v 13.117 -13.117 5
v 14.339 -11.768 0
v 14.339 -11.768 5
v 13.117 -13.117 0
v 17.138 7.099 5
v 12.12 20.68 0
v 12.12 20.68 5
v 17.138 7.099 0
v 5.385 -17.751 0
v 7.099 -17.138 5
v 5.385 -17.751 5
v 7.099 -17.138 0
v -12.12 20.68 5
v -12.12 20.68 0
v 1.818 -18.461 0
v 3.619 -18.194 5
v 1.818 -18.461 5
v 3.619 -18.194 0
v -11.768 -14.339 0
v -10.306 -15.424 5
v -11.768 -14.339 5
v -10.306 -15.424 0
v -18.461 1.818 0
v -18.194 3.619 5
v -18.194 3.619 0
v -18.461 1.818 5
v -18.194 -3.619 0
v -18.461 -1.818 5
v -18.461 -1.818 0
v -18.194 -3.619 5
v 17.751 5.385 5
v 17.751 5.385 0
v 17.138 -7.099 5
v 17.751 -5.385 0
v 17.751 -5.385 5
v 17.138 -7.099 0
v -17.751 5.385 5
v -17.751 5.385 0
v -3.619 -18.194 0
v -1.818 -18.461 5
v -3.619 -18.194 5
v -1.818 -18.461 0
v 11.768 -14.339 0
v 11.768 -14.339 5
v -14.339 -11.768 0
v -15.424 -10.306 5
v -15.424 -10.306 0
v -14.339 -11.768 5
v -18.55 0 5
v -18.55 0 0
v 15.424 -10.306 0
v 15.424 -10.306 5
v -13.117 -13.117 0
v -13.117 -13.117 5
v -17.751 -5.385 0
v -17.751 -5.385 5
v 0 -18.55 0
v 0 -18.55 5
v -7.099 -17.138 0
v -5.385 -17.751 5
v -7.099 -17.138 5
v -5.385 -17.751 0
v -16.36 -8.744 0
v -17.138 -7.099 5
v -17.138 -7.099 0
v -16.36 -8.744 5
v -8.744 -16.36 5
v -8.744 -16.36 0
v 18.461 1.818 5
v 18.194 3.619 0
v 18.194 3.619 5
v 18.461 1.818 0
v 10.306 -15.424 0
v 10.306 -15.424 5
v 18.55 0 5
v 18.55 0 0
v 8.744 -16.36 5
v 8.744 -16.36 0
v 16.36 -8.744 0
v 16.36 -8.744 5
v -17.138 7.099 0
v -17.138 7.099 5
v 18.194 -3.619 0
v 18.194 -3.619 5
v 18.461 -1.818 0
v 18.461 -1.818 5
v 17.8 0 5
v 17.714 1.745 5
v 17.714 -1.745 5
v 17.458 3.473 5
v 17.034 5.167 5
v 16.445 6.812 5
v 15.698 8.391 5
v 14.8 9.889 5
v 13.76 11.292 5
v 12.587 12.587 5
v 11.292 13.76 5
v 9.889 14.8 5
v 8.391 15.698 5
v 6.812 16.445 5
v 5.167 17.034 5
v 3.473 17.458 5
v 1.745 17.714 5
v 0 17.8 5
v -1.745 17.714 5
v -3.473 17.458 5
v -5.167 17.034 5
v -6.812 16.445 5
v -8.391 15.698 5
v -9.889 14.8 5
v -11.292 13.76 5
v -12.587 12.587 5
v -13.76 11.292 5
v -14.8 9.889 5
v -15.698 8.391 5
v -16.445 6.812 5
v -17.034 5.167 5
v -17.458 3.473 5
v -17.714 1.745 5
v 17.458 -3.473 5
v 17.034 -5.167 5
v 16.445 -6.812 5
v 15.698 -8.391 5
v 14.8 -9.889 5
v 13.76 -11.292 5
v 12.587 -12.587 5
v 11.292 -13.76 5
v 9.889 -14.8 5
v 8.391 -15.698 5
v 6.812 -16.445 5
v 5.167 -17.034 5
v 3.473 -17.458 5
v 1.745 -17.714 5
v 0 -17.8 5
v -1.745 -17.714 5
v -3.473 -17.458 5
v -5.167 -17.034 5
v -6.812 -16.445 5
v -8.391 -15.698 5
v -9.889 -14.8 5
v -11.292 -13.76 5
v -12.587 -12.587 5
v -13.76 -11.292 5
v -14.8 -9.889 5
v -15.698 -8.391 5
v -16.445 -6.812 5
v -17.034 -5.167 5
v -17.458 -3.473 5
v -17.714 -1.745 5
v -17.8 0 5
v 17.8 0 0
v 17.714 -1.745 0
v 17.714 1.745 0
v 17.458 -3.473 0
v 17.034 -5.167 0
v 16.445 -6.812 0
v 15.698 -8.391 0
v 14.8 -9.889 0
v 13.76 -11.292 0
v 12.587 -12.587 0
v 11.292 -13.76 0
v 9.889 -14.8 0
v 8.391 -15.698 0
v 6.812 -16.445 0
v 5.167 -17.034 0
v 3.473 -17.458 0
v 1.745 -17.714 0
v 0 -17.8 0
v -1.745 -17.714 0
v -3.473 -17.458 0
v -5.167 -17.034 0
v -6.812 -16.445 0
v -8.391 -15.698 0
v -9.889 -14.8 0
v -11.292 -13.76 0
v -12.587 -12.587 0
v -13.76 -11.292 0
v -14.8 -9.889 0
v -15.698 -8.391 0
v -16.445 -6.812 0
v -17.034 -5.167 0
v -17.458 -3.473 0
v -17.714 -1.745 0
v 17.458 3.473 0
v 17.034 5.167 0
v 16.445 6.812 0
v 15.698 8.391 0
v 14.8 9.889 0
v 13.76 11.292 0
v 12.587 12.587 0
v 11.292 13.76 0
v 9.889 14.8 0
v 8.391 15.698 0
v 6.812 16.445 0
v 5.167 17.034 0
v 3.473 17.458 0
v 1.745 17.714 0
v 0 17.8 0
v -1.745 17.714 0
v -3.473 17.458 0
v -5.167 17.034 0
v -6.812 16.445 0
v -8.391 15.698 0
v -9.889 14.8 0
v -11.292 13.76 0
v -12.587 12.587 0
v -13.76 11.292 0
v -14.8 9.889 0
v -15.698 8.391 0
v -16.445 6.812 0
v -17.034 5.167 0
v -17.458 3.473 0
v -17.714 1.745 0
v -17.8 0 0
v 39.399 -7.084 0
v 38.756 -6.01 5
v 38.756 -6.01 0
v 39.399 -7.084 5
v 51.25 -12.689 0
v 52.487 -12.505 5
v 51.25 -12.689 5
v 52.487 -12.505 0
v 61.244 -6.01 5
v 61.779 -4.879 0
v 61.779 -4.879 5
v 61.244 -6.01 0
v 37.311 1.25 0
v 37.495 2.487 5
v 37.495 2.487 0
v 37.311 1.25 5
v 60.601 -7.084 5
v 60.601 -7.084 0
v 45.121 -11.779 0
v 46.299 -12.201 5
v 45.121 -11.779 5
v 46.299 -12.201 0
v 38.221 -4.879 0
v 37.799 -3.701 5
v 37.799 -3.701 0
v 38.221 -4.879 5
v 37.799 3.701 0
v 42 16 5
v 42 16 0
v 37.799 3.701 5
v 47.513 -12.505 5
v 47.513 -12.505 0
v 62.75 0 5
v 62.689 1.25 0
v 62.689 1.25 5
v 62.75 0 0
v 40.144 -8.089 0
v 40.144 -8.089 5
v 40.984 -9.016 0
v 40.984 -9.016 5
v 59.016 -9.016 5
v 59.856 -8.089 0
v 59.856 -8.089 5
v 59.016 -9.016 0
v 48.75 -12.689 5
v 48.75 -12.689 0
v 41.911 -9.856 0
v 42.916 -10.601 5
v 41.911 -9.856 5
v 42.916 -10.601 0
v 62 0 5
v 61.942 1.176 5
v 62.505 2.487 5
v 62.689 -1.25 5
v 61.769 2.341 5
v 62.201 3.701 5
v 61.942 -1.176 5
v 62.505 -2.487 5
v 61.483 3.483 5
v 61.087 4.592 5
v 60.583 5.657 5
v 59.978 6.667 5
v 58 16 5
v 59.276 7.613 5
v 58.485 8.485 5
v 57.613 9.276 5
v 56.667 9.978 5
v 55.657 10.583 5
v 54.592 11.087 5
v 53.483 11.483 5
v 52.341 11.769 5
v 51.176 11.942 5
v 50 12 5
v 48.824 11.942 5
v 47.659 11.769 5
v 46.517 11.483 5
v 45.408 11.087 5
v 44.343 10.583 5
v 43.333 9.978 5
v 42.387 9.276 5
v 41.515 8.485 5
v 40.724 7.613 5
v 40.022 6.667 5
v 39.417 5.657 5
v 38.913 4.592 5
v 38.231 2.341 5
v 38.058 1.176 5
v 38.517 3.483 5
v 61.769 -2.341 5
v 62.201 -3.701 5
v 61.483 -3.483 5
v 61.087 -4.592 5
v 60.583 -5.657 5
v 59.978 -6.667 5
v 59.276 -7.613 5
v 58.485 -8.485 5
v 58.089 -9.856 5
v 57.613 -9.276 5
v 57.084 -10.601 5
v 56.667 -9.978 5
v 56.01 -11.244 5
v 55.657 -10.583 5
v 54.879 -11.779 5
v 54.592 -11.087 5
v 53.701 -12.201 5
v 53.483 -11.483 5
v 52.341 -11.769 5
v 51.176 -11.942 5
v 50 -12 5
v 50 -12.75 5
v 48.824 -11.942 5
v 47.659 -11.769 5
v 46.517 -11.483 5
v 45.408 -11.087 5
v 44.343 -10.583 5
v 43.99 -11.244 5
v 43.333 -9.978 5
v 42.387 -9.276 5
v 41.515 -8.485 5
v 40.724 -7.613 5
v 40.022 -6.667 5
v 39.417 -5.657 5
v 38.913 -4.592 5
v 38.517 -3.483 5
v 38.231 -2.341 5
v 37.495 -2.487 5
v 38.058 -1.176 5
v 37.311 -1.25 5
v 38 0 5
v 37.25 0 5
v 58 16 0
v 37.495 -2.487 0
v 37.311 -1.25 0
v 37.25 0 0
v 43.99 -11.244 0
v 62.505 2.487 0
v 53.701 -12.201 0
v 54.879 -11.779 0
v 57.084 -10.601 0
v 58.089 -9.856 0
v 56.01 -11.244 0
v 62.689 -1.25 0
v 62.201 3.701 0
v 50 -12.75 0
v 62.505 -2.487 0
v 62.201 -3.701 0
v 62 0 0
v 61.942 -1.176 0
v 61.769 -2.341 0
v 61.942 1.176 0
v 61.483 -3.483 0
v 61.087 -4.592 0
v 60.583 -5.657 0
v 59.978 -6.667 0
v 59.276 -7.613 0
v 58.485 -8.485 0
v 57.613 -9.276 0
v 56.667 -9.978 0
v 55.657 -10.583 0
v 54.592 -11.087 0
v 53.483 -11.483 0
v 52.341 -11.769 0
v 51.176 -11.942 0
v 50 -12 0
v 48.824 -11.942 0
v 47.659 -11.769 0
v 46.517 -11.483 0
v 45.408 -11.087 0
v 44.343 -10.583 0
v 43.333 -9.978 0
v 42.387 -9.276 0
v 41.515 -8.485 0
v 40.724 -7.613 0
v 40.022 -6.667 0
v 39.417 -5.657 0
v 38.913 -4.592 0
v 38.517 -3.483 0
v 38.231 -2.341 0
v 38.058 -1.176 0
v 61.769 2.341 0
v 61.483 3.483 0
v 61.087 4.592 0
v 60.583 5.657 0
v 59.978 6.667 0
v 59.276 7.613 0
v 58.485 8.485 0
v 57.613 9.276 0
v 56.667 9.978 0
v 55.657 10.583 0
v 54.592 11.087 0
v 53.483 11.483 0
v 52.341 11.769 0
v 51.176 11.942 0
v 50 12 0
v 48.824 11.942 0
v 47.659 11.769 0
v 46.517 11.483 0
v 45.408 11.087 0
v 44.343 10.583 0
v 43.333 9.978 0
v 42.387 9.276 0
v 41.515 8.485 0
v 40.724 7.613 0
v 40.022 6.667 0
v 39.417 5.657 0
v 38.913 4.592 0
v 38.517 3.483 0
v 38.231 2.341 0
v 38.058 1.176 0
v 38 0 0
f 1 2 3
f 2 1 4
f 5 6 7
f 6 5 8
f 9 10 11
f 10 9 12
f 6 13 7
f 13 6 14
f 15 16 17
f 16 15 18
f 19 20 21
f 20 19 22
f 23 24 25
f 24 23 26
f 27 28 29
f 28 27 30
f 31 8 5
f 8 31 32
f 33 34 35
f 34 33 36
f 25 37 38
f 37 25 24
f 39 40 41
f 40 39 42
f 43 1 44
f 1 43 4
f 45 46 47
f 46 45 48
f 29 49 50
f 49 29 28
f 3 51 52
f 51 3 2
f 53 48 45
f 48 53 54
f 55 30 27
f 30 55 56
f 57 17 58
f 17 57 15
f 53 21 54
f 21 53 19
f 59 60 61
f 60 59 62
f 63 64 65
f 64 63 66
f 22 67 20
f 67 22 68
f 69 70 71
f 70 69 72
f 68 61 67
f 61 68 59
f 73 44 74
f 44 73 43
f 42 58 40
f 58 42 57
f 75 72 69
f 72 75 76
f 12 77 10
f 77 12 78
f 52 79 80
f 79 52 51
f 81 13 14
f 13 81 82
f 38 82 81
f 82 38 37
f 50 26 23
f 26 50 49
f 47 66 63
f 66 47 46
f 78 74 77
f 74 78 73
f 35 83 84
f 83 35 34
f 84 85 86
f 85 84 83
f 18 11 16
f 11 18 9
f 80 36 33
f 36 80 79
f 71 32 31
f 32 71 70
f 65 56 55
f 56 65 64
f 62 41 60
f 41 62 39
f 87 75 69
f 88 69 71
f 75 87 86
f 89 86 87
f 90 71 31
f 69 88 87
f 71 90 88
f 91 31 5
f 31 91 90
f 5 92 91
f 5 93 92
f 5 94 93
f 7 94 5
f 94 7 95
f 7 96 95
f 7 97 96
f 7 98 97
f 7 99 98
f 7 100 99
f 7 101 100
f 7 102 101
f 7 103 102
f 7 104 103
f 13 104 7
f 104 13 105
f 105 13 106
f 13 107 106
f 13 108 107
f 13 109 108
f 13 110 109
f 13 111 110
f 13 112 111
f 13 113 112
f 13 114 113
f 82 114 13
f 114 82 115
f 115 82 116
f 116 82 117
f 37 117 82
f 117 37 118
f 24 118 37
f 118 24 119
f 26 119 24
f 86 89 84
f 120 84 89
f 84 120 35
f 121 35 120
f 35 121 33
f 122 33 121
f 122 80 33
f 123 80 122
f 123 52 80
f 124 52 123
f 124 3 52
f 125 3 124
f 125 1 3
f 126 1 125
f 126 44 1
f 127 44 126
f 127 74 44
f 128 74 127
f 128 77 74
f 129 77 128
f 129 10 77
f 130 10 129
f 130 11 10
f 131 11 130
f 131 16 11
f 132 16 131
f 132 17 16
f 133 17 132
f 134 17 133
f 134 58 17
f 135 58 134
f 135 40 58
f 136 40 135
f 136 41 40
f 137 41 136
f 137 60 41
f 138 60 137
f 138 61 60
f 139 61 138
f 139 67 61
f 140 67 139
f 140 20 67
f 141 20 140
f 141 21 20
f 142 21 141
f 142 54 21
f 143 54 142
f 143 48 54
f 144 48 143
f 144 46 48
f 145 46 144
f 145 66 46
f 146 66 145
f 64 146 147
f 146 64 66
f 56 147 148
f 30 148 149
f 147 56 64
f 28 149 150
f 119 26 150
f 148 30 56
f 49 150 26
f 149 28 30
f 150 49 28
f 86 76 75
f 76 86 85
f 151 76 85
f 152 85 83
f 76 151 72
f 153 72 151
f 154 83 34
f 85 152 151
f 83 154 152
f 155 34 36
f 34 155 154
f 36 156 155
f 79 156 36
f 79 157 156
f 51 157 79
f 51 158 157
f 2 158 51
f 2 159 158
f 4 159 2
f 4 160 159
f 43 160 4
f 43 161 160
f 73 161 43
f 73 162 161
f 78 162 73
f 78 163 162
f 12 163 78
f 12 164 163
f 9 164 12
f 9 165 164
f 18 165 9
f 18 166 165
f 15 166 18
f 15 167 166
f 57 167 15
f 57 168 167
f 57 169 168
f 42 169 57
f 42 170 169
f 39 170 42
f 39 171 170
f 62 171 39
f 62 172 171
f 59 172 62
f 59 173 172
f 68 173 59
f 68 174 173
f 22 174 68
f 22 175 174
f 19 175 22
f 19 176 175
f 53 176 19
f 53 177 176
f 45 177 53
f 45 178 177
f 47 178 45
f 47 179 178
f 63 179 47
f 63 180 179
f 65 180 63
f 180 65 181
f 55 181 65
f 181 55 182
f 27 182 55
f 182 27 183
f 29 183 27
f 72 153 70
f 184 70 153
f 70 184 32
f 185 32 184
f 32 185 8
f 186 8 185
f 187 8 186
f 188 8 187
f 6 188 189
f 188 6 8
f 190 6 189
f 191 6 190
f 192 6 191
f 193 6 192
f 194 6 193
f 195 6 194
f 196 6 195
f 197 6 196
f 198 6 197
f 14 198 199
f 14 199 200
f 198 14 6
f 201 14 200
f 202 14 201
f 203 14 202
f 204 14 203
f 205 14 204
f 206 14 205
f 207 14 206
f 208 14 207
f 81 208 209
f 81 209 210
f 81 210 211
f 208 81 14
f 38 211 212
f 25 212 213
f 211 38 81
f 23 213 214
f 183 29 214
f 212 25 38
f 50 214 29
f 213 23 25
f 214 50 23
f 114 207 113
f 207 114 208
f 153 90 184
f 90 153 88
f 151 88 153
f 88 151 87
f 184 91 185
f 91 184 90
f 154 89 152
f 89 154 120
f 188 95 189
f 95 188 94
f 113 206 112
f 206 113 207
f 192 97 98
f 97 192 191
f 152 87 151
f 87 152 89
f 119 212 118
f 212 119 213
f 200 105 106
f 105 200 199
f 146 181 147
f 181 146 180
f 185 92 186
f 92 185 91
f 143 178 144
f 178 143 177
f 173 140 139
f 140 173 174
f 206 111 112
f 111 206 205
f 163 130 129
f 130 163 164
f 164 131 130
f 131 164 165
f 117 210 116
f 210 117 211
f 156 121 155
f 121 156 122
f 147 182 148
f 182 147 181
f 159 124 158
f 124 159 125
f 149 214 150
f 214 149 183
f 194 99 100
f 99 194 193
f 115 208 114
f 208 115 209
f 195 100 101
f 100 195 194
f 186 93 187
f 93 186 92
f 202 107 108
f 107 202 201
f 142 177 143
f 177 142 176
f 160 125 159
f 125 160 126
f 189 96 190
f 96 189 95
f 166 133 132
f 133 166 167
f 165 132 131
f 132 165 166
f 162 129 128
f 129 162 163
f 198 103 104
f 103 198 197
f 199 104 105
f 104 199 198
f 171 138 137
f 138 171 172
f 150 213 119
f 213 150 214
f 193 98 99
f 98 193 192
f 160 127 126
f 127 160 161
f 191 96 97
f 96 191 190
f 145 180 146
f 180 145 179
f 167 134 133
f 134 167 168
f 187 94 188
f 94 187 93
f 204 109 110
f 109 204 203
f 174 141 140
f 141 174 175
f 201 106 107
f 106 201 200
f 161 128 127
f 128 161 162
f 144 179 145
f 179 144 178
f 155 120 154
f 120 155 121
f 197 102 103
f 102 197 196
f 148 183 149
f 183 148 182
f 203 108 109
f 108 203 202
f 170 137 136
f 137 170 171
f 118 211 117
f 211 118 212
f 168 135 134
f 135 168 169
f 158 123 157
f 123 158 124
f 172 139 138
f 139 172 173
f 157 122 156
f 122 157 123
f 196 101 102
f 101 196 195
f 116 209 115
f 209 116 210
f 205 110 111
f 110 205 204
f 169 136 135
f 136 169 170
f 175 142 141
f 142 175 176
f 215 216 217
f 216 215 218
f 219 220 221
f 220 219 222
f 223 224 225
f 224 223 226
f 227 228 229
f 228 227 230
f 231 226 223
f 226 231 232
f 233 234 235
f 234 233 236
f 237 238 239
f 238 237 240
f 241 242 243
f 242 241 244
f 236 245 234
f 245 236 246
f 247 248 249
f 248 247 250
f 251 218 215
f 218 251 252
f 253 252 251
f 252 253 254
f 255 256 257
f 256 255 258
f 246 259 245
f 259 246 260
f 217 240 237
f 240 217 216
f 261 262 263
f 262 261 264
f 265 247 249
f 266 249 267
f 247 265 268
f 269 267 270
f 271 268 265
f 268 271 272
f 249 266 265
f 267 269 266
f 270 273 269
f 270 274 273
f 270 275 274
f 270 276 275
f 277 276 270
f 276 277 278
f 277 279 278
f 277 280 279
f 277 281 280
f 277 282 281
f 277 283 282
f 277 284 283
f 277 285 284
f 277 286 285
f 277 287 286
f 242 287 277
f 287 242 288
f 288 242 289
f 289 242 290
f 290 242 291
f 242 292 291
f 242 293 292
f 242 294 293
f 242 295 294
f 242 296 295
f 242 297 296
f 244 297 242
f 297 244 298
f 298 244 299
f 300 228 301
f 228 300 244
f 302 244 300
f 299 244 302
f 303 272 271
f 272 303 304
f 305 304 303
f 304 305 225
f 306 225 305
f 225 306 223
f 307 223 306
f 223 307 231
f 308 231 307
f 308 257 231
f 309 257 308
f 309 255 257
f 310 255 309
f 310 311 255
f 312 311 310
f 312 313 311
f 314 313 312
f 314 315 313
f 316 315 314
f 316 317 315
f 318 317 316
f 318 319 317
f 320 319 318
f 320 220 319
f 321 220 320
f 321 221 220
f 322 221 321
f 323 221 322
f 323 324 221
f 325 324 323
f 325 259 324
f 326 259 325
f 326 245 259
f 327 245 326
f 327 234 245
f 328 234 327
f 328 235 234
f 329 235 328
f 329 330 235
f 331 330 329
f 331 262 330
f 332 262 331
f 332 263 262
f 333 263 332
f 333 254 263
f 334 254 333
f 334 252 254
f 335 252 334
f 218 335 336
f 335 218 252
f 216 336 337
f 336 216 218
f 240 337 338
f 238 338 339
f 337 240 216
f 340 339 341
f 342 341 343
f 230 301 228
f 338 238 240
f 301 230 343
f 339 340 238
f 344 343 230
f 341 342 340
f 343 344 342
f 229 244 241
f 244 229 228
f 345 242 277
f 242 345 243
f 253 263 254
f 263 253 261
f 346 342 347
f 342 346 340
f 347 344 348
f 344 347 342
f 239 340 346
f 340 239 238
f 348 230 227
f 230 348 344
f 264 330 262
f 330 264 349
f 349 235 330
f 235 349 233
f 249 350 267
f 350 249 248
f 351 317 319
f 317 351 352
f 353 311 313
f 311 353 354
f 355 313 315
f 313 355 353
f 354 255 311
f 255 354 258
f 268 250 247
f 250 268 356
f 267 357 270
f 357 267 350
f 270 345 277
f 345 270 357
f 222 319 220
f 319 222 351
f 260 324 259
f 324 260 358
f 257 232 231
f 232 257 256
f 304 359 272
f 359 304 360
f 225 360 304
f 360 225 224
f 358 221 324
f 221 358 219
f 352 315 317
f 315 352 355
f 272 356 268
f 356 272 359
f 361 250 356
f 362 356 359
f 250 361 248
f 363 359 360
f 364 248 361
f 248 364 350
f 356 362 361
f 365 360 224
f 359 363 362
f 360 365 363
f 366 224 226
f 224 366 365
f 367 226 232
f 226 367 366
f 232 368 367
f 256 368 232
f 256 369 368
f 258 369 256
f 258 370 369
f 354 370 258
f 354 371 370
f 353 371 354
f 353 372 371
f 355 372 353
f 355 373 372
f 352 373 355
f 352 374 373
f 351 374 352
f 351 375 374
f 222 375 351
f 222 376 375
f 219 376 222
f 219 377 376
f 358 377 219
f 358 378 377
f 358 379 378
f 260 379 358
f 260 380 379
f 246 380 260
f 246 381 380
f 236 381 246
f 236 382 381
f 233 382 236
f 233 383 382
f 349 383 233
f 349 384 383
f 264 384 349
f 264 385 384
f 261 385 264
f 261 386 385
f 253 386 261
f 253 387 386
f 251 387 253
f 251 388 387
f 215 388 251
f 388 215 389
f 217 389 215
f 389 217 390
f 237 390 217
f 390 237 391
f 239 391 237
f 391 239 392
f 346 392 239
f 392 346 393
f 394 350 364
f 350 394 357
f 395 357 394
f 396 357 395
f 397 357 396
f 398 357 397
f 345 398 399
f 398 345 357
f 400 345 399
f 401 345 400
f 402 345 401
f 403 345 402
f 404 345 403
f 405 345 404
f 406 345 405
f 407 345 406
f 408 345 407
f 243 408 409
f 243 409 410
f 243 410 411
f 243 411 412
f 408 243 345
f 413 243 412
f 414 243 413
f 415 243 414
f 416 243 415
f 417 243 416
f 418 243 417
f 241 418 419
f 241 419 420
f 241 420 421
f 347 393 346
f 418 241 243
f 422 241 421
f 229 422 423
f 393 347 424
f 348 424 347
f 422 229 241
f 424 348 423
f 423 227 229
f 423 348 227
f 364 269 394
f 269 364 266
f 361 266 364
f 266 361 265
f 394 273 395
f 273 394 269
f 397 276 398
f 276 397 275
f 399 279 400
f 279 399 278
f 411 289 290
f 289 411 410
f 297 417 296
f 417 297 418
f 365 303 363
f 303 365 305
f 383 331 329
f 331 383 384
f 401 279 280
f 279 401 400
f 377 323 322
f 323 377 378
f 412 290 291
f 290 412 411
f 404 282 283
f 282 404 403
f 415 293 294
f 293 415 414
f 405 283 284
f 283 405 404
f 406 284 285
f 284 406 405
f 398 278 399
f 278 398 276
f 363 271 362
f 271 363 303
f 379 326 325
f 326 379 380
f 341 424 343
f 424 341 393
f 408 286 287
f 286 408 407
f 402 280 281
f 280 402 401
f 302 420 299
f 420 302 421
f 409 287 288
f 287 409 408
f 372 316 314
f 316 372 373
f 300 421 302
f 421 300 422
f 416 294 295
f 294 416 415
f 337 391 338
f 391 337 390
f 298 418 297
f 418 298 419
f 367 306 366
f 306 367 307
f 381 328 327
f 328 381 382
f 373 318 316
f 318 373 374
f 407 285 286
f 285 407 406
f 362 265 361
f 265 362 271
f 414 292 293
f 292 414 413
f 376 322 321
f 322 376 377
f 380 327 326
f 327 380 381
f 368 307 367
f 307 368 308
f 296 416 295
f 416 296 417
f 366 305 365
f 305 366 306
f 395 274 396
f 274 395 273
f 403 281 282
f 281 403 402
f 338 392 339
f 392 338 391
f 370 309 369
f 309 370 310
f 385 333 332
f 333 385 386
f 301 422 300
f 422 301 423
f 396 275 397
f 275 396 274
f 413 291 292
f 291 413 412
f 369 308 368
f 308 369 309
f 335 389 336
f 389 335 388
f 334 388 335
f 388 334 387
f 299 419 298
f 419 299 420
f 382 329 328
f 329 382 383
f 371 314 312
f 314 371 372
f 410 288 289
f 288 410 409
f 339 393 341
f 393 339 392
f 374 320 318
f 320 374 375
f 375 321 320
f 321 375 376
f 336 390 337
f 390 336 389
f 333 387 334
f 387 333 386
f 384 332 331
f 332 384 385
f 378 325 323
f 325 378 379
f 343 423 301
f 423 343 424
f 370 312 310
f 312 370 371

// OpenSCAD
$fn=64;


module PlateRing(
    rimRadius = 17.80, // 17.80 is equivalent to 18 in brazilian finger measure
    rimTickness = 0.75,
    rimWidth = 5,

    plateWidth = 0.5,
    plateHeight = 0.5,
    minPlateWidth = 10,
    minPlateHeight = 10
) {
    module Plate(plateMeasures) {
        translate([plateMeasures.x * -0.5, 0, 0]) {
            cube(plateMeasures);
        }
    }

    difference() {
        hull() {
            cylinder(h=rimWidth, r=rimRadius + rimTickness);
            Plate(
                plateMeasures = [
                    rimRadius * plateWidth + minPlateWidth,
                    rimRadius * plateHeight + minPlateHeight,
                    rimWidth
                ]
            );
        }

        translate([0, 0, rimTickness * -0.5]) {
            cylinder(h=rimWidth + 2, r=rimRadius);
        }
    }
}

PlateRing(plateWidth=0.8, plateHeight=0.6);

translate([50, 0, 0]) PlateRing(rimRadius=12);
